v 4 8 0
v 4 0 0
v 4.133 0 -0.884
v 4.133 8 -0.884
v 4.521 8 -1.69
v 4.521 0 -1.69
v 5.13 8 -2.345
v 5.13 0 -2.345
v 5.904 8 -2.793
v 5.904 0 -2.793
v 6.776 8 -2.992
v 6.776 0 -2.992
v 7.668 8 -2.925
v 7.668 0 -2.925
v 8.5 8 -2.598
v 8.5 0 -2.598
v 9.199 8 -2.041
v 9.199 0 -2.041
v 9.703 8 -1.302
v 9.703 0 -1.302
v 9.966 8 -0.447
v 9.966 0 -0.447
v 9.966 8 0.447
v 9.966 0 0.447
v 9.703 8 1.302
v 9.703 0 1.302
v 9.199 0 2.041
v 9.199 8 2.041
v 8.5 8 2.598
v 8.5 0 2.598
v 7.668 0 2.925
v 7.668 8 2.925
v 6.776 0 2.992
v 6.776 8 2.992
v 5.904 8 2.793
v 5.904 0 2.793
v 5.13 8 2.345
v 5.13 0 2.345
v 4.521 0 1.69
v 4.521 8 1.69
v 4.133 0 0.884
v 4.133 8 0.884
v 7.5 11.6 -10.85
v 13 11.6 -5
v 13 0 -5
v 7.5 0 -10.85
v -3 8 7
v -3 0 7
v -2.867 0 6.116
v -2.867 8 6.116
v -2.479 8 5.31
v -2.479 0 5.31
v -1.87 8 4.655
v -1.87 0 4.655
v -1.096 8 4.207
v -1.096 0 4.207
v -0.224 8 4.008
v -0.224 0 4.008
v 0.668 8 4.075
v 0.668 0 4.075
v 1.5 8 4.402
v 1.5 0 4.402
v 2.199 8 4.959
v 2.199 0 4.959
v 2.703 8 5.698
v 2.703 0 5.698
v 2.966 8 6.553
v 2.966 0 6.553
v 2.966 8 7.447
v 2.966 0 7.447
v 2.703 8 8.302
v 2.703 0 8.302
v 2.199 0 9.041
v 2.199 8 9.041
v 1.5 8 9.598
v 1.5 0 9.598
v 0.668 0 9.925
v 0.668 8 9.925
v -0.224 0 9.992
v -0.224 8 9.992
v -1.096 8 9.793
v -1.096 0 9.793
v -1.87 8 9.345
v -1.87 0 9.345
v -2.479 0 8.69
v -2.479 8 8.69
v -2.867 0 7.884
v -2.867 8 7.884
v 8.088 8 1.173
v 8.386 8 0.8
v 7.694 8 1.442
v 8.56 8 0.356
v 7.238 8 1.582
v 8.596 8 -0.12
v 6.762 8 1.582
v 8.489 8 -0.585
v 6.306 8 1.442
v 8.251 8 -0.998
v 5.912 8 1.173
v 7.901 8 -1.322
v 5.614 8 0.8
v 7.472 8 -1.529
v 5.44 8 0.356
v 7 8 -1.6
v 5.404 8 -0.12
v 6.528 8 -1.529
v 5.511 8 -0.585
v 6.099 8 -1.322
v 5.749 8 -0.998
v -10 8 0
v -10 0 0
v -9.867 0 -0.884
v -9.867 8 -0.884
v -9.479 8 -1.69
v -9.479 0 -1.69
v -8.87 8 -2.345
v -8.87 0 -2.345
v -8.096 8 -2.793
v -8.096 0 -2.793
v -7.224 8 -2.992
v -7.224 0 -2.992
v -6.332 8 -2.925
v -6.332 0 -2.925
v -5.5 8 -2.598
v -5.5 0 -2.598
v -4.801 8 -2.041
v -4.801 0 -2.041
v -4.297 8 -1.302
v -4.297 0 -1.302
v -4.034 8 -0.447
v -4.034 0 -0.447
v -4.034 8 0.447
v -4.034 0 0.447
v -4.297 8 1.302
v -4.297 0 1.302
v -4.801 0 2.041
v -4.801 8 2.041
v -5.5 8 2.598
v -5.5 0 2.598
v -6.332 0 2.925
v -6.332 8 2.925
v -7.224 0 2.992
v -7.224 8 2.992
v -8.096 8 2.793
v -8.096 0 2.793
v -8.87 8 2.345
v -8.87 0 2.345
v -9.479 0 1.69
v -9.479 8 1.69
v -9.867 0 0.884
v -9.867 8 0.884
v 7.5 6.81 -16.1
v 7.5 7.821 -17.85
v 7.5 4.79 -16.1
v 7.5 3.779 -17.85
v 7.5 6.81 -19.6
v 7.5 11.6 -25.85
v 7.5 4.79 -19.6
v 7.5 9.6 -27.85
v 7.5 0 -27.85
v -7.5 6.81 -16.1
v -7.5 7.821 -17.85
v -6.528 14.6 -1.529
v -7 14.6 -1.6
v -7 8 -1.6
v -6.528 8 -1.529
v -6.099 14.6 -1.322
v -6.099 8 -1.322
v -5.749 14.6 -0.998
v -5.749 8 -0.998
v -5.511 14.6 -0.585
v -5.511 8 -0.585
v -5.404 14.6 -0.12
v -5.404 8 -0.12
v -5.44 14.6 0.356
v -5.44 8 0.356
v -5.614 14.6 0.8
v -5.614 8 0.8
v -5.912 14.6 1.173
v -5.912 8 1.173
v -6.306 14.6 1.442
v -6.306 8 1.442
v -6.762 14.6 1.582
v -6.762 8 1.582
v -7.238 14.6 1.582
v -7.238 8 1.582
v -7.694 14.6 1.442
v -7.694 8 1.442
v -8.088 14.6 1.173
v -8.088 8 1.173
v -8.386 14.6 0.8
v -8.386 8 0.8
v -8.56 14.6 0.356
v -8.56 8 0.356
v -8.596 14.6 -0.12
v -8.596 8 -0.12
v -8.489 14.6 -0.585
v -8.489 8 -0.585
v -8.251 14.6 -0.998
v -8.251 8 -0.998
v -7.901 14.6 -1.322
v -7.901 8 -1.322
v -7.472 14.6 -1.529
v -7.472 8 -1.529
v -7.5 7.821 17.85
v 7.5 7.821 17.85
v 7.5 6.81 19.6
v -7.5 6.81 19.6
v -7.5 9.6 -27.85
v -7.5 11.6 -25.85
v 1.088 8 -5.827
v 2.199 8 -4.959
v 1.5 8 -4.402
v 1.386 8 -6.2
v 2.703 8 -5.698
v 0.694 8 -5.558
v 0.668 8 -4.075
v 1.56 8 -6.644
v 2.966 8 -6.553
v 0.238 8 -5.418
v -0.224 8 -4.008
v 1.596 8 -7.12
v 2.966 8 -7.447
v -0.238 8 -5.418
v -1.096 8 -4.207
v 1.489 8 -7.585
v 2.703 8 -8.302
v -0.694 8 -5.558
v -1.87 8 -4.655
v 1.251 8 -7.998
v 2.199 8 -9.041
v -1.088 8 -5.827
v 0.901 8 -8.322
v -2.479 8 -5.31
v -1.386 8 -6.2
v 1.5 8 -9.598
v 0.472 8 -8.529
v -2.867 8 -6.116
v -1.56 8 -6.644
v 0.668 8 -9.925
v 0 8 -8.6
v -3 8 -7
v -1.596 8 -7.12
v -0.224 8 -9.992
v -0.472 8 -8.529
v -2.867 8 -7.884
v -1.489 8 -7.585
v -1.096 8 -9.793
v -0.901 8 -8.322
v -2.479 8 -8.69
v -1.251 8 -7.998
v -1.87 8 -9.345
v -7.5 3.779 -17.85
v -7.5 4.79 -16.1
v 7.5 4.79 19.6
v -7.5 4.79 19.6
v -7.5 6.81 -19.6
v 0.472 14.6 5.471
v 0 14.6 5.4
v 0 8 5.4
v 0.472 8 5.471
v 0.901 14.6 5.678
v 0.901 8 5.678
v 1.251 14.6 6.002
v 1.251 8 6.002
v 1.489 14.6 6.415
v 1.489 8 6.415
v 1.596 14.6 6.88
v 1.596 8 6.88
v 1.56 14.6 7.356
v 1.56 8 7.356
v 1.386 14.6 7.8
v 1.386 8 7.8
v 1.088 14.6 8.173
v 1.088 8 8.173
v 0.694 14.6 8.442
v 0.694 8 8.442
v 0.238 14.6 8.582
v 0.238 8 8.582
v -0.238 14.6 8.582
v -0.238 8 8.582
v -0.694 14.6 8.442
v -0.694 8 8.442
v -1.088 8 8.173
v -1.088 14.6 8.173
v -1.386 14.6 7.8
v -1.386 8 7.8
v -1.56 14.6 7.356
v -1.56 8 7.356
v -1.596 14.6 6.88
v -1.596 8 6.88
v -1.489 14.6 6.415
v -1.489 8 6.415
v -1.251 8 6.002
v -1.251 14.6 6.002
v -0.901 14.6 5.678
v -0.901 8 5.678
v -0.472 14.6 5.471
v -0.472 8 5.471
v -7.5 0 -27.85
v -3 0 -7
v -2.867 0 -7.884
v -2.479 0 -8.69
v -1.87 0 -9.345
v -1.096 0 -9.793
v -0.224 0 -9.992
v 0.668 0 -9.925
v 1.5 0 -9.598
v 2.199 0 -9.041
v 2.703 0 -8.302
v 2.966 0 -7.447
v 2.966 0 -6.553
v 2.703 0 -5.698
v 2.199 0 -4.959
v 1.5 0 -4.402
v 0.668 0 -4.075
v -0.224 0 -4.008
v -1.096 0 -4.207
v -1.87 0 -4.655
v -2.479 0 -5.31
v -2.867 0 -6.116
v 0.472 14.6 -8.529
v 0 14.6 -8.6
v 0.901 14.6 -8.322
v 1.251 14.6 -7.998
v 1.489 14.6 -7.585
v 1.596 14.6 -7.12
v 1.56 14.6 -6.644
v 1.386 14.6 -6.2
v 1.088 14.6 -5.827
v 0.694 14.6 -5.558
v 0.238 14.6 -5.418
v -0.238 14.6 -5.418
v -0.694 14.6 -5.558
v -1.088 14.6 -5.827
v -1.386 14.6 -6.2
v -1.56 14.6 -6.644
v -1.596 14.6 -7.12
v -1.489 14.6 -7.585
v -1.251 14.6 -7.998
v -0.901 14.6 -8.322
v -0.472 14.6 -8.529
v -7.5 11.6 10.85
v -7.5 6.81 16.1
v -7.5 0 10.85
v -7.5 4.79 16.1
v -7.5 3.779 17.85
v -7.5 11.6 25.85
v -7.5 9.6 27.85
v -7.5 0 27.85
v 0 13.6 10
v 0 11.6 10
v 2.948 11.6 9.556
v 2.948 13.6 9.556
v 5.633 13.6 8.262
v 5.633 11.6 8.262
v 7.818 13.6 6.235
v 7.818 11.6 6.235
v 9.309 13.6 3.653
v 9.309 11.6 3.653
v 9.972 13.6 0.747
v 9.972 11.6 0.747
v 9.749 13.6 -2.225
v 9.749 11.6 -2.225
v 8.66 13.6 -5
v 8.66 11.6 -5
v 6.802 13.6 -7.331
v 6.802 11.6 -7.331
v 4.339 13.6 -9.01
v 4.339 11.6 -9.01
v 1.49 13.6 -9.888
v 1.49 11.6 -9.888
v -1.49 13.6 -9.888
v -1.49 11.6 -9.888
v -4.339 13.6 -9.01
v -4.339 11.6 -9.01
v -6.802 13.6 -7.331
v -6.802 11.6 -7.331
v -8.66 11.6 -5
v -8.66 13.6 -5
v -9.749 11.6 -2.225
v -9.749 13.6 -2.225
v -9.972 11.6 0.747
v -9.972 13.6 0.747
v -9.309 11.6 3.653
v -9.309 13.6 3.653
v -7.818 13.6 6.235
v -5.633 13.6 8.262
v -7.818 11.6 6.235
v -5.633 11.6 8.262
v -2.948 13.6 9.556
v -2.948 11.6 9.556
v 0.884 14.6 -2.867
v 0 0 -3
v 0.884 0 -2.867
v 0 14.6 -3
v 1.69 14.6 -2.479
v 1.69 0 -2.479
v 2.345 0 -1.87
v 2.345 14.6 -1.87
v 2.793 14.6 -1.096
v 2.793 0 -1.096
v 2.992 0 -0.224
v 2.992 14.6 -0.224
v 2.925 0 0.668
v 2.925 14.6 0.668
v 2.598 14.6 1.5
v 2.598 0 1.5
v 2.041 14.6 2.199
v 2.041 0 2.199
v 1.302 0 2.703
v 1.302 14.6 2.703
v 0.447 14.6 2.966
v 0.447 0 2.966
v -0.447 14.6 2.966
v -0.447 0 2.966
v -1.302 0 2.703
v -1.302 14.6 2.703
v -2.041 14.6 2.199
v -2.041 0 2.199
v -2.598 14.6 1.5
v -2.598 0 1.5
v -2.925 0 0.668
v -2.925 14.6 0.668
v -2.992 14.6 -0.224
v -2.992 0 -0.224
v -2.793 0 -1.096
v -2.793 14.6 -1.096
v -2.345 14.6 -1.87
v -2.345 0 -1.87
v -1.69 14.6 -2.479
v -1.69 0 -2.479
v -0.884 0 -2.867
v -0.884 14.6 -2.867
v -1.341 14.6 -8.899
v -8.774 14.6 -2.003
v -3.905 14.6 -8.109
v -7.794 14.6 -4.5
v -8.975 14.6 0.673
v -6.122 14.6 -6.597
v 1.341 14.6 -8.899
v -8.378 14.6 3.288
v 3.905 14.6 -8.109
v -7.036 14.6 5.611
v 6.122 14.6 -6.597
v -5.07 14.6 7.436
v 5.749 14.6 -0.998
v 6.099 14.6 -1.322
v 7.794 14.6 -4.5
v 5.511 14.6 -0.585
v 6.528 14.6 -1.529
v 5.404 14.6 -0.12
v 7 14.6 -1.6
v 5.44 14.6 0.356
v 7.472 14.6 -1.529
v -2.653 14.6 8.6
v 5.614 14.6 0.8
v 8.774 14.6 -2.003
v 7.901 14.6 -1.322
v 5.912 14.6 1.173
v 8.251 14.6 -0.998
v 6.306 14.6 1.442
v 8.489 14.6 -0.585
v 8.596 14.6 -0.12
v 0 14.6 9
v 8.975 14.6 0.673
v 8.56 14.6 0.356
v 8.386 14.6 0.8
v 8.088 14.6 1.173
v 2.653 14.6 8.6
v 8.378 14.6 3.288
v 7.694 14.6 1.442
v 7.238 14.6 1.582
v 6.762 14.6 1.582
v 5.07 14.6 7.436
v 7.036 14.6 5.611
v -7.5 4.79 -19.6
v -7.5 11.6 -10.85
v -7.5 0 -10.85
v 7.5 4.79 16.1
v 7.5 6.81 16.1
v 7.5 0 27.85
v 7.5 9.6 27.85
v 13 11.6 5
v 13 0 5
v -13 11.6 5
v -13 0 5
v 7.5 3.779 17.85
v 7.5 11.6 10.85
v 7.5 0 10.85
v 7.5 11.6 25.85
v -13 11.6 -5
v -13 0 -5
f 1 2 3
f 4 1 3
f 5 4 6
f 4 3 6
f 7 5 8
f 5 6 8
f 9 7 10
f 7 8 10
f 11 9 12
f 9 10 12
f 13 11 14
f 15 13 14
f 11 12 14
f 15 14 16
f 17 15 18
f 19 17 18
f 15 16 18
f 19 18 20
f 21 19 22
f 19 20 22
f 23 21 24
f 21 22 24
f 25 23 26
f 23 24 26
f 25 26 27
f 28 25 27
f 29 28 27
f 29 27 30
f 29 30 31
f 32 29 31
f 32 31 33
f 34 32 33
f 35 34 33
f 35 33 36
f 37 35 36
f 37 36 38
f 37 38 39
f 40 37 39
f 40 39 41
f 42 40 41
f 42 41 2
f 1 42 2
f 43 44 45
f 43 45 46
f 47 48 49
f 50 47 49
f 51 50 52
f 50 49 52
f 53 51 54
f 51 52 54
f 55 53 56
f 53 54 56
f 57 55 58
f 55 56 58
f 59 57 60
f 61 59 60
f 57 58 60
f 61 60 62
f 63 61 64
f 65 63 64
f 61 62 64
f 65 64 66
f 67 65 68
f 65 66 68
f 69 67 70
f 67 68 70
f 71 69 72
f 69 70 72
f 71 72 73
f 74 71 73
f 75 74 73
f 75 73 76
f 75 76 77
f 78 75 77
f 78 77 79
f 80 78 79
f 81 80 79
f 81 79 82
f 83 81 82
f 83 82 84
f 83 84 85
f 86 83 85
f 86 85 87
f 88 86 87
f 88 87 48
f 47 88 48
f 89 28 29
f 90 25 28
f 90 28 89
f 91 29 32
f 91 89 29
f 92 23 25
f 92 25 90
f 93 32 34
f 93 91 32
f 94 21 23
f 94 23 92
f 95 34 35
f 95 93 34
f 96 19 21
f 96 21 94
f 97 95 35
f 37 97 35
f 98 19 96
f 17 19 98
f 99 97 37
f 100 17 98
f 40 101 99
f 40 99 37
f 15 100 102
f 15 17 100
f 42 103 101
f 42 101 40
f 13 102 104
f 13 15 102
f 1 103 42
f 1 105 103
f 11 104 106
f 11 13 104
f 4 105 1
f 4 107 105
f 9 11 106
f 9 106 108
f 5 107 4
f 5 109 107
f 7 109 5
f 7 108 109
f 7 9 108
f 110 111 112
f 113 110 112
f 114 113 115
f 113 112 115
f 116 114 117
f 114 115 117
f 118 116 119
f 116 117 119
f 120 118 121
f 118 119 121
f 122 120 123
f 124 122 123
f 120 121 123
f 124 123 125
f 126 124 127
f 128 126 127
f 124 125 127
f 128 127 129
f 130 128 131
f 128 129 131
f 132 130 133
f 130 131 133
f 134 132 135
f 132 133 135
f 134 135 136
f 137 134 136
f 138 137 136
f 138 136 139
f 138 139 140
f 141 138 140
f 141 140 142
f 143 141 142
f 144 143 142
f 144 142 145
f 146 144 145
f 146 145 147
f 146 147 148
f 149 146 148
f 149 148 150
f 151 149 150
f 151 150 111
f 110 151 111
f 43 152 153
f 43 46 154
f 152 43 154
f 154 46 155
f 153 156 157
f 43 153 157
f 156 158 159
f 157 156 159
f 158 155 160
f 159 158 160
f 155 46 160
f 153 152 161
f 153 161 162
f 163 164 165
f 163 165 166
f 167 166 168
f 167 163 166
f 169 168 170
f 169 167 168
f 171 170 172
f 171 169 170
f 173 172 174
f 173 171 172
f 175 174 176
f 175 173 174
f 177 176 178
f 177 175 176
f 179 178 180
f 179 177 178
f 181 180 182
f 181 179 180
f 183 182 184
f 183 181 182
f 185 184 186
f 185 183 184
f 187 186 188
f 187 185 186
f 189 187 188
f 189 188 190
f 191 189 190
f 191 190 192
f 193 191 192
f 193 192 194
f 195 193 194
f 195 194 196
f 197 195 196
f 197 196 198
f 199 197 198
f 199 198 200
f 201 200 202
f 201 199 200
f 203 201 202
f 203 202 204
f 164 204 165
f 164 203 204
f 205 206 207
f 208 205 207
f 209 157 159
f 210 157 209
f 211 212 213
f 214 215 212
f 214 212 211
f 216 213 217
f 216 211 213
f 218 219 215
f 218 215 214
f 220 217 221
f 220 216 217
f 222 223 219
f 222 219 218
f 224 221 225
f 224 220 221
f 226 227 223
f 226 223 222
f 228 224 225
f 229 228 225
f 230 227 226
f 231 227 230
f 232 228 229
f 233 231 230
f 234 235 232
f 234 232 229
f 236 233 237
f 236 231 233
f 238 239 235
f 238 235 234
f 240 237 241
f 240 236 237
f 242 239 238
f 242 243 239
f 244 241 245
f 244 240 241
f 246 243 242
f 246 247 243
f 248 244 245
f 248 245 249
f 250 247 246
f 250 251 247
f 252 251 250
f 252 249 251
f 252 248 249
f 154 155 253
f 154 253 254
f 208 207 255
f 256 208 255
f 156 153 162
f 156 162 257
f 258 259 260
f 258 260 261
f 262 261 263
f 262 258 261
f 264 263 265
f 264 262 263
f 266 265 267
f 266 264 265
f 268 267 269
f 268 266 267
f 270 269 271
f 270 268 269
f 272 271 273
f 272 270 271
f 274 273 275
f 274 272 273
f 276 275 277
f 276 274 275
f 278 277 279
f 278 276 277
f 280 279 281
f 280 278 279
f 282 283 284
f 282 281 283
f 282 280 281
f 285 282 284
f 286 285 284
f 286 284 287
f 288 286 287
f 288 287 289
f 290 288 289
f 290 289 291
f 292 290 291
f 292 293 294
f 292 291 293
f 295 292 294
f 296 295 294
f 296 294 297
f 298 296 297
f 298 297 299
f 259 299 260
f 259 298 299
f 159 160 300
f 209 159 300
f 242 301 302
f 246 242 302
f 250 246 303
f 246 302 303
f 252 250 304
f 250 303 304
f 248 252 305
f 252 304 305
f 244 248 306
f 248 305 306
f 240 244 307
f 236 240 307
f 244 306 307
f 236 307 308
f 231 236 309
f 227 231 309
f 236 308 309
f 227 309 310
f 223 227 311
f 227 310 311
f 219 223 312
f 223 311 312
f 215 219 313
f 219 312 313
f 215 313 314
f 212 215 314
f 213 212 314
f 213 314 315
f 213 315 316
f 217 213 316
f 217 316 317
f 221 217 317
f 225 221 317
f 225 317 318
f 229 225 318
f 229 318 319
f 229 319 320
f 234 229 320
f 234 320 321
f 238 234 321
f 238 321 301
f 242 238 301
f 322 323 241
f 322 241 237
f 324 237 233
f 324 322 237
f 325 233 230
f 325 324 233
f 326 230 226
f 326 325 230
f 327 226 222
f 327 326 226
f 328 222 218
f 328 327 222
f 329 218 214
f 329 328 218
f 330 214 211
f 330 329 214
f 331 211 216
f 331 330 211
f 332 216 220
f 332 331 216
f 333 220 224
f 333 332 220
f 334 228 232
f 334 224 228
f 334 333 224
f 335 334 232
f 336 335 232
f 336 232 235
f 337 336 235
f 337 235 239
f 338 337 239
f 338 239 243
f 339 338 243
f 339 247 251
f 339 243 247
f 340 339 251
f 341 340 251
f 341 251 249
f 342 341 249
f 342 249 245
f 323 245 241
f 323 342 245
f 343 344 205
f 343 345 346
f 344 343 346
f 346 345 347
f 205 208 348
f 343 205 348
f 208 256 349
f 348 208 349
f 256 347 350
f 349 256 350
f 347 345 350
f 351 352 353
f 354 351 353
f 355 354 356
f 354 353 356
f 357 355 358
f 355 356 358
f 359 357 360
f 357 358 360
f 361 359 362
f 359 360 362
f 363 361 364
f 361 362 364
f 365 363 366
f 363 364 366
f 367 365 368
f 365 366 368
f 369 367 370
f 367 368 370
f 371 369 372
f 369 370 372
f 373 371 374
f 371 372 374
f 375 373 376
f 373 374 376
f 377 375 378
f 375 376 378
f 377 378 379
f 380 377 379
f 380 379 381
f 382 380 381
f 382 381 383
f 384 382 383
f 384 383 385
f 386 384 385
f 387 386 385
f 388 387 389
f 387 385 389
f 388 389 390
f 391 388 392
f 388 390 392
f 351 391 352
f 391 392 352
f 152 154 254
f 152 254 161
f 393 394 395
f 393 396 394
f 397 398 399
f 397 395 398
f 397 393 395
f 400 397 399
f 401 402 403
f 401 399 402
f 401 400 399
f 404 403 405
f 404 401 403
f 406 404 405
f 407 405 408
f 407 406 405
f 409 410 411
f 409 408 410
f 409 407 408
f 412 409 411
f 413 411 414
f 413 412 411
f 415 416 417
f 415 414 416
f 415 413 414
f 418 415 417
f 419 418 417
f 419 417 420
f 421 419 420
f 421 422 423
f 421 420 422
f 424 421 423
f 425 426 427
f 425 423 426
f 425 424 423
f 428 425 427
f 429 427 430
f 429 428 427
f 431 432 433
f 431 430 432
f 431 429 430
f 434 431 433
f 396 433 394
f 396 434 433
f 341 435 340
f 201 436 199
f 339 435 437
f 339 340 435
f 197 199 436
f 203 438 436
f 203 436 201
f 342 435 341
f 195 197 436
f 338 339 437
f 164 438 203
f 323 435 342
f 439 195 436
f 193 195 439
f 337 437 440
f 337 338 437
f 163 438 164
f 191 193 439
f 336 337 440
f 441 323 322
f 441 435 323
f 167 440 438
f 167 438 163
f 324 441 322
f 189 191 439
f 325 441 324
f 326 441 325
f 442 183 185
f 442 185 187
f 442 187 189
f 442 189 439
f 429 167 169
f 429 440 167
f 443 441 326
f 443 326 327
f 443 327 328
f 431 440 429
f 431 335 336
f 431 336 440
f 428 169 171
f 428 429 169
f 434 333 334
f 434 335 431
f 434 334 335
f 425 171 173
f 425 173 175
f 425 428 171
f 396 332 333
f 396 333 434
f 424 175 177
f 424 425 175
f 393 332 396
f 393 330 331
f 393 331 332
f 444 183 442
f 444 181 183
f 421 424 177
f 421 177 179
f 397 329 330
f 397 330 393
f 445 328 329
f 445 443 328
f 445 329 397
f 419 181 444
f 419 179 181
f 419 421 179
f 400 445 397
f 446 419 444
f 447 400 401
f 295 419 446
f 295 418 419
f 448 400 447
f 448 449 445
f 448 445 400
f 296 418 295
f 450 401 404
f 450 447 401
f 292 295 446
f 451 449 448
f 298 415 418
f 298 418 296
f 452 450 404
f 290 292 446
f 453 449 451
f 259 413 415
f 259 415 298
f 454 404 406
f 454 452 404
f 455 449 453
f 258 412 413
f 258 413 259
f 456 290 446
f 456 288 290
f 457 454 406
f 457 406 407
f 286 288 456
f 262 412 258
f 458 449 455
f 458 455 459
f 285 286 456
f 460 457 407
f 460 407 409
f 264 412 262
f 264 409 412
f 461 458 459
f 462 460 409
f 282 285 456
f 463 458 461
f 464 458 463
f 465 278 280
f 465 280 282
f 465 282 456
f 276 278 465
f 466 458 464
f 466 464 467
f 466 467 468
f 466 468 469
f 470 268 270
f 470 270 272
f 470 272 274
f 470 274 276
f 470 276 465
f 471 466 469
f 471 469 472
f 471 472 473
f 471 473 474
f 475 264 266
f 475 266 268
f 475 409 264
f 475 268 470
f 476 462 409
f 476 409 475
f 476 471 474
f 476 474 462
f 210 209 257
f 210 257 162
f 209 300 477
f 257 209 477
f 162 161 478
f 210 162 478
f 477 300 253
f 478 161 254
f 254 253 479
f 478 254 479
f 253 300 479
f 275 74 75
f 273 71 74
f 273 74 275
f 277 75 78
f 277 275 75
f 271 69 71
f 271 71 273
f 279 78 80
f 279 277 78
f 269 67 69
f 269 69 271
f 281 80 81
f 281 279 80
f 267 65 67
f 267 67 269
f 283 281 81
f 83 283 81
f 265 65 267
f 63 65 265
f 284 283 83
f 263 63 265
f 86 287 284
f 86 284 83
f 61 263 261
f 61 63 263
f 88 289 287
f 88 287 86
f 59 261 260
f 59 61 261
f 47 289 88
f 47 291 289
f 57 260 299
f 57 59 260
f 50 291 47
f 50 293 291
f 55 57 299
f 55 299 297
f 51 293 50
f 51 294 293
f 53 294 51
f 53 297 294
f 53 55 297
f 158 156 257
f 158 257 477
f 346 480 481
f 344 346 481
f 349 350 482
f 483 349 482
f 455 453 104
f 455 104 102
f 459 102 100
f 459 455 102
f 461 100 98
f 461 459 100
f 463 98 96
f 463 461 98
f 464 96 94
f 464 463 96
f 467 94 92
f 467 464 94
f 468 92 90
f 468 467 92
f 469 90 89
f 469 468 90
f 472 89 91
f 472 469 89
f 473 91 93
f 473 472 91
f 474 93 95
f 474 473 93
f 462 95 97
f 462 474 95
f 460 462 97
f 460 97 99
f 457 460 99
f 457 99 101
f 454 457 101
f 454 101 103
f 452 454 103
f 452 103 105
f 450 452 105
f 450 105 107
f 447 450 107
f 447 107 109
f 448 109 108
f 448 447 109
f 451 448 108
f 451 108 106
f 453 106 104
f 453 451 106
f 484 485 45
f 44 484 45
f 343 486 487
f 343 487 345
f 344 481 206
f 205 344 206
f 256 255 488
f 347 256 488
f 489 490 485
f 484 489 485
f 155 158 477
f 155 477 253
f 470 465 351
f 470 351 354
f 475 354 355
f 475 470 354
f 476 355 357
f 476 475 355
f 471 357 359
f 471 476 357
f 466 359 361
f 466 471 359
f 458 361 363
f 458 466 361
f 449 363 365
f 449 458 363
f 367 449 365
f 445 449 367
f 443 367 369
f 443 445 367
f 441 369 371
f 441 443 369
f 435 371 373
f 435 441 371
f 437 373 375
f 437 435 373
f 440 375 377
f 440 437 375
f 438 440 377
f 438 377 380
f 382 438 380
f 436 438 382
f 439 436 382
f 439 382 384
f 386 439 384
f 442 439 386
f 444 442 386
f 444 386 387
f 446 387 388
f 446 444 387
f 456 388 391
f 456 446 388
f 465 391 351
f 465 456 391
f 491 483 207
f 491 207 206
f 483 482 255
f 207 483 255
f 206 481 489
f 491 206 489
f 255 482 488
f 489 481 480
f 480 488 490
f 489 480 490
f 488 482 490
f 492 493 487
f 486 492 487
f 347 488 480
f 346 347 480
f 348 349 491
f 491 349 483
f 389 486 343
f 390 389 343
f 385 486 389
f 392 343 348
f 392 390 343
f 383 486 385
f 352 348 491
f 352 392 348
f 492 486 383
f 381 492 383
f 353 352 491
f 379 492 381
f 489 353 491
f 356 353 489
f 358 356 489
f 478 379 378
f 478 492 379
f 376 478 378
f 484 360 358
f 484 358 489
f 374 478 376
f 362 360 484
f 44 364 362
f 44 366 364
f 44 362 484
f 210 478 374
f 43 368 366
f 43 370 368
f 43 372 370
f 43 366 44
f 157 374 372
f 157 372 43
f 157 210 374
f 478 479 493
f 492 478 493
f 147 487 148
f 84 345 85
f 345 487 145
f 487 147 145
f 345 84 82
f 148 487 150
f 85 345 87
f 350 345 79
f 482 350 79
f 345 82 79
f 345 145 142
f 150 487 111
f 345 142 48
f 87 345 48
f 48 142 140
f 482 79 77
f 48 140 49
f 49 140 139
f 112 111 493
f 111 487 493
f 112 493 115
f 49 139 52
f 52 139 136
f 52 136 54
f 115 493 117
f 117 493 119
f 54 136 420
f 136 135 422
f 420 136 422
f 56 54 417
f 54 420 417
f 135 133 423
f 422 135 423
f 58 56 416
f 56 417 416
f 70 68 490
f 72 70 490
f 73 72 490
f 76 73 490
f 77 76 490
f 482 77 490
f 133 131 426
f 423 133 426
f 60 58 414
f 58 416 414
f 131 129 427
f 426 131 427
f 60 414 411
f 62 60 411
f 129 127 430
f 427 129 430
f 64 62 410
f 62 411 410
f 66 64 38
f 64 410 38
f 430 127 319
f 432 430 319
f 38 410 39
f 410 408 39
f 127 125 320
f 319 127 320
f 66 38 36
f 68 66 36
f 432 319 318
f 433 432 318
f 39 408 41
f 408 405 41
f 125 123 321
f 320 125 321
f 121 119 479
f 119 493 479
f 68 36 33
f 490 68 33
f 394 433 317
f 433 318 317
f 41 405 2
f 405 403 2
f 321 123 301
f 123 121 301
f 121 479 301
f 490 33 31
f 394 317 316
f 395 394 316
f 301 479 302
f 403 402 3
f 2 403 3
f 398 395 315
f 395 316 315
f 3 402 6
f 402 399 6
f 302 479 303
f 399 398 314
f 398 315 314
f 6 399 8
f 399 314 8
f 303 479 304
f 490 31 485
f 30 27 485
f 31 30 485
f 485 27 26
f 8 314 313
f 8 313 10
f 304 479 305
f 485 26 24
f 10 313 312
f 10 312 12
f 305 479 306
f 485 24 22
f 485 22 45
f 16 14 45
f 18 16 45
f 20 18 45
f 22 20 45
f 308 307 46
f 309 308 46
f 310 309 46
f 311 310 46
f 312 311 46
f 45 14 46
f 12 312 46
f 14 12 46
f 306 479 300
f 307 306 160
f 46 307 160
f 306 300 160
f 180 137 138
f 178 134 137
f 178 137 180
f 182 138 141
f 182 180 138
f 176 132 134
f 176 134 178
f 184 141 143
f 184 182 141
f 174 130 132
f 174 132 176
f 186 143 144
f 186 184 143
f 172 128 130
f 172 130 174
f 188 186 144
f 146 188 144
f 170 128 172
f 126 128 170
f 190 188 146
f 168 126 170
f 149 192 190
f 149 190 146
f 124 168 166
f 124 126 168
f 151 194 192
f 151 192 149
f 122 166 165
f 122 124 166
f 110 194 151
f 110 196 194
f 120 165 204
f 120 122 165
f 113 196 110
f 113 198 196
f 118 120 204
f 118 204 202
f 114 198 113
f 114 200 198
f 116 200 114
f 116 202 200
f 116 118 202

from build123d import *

# Parameters (mm, degrees)
BOSS_EXTRU_1_DEPTH                                = 11.6
ESQUISSE2_R                                       = 10
BOSS_EXTRU_2_DEPTH                                = 3
ENL_V_MAT_EXTRU_1_DEPTH                           = 35.026203138
ENL_V_MAT_EXTRU_1_DEPTH_BACK                      = 35.026203138
ESQUISSE3_R                                       = 1.6
ESQUISSE3_R_2                                     = 3
CHAMBRAGE_POUR_VIS_SIX_PANS_CREUX_M41_D           = 3.2
CHAMBRAGE_POUR_VIS_SIX_PANS_CREUX_M41_CBORE_D     = 6
CHAMBRAGE_POUR_VIS_SIX_PANS_CREUX_M41_CBORE_DEPTH = 8
ENL_V_MAT_EXTRU_2_DEPTH                           = 38.537081666
ENL_V_MAT_EXTRU_2_DEPTH_BACK                      = 38.537081666
CHANFREIN1_SIZE                                   = 2
CHANFREIN2_SIZE                                   = 1


with BuildPart() as part:
    # Esquisse1 → Boss.-Extru.1 (new body)
    with BuildSketch(Plane(origin=(0, 0, 0), x_dir=(1, 0, 0), z_dir=(0, 1, 0))):
        Polygon((7.5, 27.85), (-7.5, 27.85), (-7.5, 10.85), (-13, 5), (-13, -5), (-7.5, -10.85), (-7.5, -27.85), (7.5, -27.85), (7.5, -10.85), (13, -5), (13, 5), (7.5, 10.85), align=None)
    extrude(amount=BOSS_EXTRU_1_DEPTH)

    # Esquisse2 → Boss.-Extru.2 (add)
    with BuildSketch(Plane(origin=(0, 11.6, 0), x_dir=(1, 0, 0), z_dir=(0, 1, 0))):
        with Locations(Location((0, 0, 0), (0, 0, 270))):
            Circle(ESQUISSE2_R)
    extrude(amount=BOSS_EXTRU_2_DEPTH)

    # Esquisse3 → Enlèv. mat.-Extru.1 (cut, two sides: drawn at the far end of the back side and taken through both)
    with BuildSketch(Plane.XZ.offset(-ENL_V_MAT_EXTRU_1_DEPTH_BACK)):
        with Locations(Location((0, 7, 0), (0, 0, 270))):
            Circle(ESQUISSE3_R)
        with Locations(Location((7, 0, 0), (0, 0, 270))):
            Circle(ESQUISSE3_R)
        with Locations(Location((0, -7, 0), (0, 0, 270))):
            Circle(ESQUISSE3_R)
        with Locations(Location((-7, 0, 0), (0, 0, 270))):
            Circle(ESQUISSE3_R)
        with Locations(Location((0, 0, 0), (0, 0, 270))):
            Circle(ESQUISSE3_R_2)
    extrude(amount=ENL_V_MAT_EXTRU_1_DEPTH + ENL_V_MAT_EXTRU_1_DEPTH_BACK, mode=Mode.SUBTRACT)

    # Chambrage pour vis à six pans creux M41 (through all)
    with Locations(Plane(origin=(0, 0, 0), x_dir=(-1, 0, 0), z_dir=(0, -1, 0))):
        with Locations((0, 0), (0, 7), (7, 0), (0, -7), (-7, 0)):
            CounterBoreHole(CHAMBRAGE_POUR_VIS_SIX_PANS_CREUX_M41_D / 2, CHAMBRAGE_POUR_VIS_SIX_PANS_CREUX_M41_CBORE_D / 2, CHAMBRAGE_POUR_VIS_SIX_PANS_CREUX_M41_CBORE_DEPTH)

    # Esquisse6 → Enlèv. mat.-Extru.2 (cut, two sides: drawn at the far end of the back side and taken through both)
    with BuildSketch(Plane.ZY.offset(7.5).offset(-ENL_V_MAT_EXTRU_2_DEPTH_BACK)):
        Polygon((16.1, 6.810362971), (17.85, 7.820725942), (19.6, 6.810362971), (19.6, 4.789637029), (17.85, 3.779274058), (16.1, 4.789637029), align=None)
        Polygon((-17.85, 7.820725942), (-19.6, 6.810362971), (-19.6, 4.789637029), (-17.85, 3.779274058), (-16.1, 4.789637029), (-16.1, 6.810362971), align=None)
    extrude(amount=ENL_V_MAT_EXTRU_2_DEPTH + ENL_V_MAT_EXTRU_2_DEPTH_BACK, mode=Mode.SUBTRACT)

    # Chanfrein1
    chanfrein1_edges = [part.edges().sort_by_distance(p)[0] for p in [
        (0, 11.6, 27.85),
        (0, 11.6, -27.85),
    ]]
    chamfer(chanfrein1_edges, length=CHANFREIN1_SIZE)

    # Chanfrein2
    chanfrein2_edges = [part.edges().sort_by_distance(p)[0] for p in [
        (0, 14.6, -10),
    ]]
    chamfer(chanfrein2_edges, length=CHANFREIN2_SIZE)


solid = part.part
